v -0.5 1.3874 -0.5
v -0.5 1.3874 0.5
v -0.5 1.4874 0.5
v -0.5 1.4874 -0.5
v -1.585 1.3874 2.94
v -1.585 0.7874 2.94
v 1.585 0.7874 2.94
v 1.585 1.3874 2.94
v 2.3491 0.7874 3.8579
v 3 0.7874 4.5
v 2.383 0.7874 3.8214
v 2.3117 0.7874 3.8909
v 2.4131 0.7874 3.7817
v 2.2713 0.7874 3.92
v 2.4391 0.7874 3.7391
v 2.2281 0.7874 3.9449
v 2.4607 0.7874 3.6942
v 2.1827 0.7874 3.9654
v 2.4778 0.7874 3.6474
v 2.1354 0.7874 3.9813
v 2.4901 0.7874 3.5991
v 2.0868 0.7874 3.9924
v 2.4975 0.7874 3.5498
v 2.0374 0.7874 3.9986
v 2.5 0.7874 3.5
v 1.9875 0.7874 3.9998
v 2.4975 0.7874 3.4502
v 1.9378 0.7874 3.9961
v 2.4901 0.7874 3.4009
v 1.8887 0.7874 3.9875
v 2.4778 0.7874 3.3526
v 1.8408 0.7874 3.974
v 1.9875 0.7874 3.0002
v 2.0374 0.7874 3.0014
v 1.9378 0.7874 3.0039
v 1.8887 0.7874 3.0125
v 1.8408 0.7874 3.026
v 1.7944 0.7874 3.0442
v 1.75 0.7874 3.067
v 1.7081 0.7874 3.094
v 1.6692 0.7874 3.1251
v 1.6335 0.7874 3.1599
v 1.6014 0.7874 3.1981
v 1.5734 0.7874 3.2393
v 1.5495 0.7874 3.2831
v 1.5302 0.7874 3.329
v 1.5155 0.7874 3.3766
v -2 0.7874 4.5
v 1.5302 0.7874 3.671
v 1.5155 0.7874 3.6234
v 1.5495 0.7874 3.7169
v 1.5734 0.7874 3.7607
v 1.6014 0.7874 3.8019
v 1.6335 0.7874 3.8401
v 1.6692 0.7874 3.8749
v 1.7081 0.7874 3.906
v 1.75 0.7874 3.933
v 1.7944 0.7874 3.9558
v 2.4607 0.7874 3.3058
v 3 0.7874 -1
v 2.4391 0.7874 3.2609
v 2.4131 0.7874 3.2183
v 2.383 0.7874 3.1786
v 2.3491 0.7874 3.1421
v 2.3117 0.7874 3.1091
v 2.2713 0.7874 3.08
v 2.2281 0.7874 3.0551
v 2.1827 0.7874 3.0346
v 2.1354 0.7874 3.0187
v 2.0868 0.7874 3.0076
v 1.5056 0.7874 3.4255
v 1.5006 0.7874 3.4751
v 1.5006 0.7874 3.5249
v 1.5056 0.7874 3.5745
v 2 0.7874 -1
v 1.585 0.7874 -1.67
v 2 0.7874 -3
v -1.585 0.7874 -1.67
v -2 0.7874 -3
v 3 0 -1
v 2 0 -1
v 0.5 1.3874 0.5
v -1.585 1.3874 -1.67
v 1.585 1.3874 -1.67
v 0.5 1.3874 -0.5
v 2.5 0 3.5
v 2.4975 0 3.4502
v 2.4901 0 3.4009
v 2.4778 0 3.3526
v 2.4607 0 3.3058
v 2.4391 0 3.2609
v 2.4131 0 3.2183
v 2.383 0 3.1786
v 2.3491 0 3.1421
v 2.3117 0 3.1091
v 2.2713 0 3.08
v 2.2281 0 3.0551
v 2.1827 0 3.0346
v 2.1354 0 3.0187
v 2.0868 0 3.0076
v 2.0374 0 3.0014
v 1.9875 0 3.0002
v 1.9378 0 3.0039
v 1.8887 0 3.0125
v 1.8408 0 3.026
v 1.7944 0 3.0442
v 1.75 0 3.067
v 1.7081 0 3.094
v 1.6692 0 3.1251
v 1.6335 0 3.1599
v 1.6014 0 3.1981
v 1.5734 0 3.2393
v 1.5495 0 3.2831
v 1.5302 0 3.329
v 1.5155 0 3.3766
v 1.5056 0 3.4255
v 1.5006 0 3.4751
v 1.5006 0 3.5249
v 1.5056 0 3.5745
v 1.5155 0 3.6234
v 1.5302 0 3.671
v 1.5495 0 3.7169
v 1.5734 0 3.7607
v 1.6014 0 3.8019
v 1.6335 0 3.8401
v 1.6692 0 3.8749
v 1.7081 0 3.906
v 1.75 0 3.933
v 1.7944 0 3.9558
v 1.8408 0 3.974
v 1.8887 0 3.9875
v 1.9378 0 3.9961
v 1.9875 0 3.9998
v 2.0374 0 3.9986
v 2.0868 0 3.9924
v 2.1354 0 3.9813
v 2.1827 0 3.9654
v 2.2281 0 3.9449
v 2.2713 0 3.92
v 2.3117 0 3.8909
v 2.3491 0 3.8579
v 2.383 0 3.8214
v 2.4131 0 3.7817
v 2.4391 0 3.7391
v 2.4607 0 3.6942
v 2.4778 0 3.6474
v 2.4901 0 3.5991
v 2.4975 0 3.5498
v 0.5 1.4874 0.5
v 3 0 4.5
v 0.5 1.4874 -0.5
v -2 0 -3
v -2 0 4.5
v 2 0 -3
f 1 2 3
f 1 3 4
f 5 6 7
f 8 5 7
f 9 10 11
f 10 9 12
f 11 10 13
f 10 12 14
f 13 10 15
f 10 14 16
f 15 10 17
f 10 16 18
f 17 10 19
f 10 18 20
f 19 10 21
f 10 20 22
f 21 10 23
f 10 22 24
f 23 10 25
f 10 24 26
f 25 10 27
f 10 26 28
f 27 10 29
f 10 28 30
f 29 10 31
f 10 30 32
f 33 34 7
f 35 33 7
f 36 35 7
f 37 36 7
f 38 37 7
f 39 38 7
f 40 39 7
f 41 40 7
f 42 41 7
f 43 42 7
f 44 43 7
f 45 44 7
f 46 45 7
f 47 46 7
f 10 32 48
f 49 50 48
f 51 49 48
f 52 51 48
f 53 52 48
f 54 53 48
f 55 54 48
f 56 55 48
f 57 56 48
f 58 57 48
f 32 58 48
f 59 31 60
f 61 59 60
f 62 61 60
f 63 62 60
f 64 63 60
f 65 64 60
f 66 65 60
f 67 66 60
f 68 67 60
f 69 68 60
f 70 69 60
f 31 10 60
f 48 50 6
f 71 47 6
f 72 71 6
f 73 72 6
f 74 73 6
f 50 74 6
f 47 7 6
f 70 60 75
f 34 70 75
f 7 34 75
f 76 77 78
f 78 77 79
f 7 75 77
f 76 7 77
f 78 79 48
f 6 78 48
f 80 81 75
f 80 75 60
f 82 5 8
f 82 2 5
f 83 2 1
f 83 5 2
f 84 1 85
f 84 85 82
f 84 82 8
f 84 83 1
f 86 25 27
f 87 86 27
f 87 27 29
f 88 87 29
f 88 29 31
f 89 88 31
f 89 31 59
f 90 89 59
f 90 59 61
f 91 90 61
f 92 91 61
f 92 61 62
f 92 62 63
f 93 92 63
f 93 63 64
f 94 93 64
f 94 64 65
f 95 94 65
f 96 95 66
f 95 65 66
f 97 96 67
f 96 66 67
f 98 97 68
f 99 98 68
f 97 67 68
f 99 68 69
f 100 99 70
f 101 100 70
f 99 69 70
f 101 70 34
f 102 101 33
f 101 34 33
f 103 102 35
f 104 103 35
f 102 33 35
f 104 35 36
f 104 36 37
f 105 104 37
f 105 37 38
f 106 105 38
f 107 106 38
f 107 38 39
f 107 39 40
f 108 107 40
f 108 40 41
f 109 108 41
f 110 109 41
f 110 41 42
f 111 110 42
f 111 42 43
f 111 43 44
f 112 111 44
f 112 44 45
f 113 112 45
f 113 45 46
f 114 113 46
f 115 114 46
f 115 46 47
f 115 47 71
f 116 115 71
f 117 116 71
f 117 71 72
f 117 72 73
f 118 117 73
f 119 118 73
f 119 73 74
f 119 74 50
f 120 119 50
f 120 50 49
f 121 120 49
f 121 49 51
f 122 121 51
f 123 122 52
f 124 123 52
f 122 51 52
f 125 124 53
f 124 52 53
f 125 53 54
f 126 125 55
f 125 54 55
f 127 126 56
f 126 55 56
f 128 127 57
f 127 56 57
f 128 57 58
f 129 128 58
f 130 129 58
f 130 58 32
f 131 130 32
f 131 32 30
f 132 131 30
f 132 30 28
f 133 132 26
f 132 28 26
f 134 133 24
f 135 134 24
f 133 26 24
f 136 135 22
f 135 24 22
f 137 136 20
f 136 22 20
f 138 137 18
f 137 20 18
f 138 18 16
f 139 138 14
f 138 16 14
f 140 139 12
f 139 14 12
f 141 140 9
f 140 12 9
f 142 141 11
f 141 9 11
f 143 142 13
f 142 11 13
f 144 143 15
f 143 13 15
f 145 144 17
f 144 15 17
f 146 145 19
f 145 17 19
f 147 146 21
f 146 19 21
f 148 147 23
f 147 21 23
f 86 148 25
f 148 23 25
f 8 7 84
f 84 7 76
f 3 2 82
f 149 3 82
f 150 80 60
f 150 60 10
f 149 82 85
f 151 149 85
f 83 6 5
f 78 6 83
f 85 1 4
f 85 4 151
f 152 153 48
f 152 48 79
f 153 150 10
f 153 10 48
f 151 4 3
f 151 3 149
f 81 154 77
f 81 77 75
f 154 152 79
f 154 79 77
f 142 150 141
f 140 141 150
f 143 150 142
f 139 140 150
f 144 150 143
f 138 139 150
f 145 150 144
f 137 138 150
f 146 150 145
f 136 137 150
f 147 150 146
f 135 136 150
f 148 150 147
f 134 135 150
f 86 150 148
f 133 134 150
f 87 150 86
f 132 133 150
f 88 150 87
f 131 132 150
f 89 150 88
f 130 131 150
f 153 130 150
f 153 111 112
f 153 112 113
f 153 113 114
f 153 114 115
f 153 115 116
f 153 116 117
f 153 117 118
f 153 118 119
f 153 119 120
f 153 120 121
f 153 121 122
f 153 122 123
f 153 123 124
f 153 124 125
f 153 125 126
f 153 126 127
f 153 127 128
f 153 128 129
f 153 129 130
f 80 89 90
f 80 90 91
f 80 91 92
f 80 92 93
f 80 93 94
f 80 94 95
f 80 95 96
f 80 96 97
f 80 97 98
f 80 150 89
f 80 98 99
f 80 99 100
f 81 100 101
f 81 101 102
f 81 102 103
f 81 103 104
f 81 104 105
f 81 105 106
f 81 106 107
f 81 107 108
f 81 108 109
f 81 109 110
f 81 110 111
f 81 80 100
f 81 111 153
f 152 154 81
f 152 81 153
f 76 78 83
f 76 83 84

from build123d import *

# Parameters (mm, degrees)
BOSS_EXTRUDE1_DEPTH = 0.7874
SKETCH4_W           = 3.17
SKETCH4_H           = 4.61
BOSS_EXTRUDE3_DEPTH = 0.6
SKETCH2_W           = 1
SKETCH2_H           = 1
BOSS_EXTRUDE2_DEPTH = 0.1
SKETCH5_R           = 0.5
CUT_EXTRUDE1_DEPTH  = 1.7874


with BuildPart() as part:
    # Sketch1 → Boss-Extrude1 (new body)
    with BuildSketch(Plane(origin=(0, 0, 0), x_dir=(1, 0, 0), z_dir=(0, 1, 0))):
        Polygon((2, 3), (2, 1), (3, 1), (3, -4.5), (-2, -4.5), (-2, 3), align=None)
    extrude(amount=BOSS_EXTRUDE1_DEPTH)

    # Sketch4 → Boss-Extrude3 (add)
    with BuildSketch(Plane(origin=(0, 0.7874, 0), x_dir=(1, 0, 0), z_dir=(0, 1, 0))):
        with Locations((0, -0.635)):
            Rectangle(SKETCH4_W, SKETCH4_H)
    extrude(amount=BOSS_EXTRUDE3_DEPTH)

    # Sketch2 → Boss-Extrude2 (add)
    with BuildSketch(Plane(origin=(0, 1.3874, 0), x_dir=(1, 0, 0), z_dir=(0, 1, 0))):
        Rectangle(SKETCH2_W, SKETCH2_H)
    extrude(amount=BOSS_EXTRUDE2_DEPTH)

    # Sketch5 → Cut-Extrude1 (cut, through all)
    with BuildSketch(Plane(origin=(0, 0.7874, 0), x_dir=(1, 0, 0), z_dir=(0, 1, 0))):
        with Locations((2, -3.5)):
            Circle(SKETCH5_R)
    extrude(amount=-CUT_EXTRUDE1_DEPTH, mode=Mode.SUBTRACT)


solid = part.part
